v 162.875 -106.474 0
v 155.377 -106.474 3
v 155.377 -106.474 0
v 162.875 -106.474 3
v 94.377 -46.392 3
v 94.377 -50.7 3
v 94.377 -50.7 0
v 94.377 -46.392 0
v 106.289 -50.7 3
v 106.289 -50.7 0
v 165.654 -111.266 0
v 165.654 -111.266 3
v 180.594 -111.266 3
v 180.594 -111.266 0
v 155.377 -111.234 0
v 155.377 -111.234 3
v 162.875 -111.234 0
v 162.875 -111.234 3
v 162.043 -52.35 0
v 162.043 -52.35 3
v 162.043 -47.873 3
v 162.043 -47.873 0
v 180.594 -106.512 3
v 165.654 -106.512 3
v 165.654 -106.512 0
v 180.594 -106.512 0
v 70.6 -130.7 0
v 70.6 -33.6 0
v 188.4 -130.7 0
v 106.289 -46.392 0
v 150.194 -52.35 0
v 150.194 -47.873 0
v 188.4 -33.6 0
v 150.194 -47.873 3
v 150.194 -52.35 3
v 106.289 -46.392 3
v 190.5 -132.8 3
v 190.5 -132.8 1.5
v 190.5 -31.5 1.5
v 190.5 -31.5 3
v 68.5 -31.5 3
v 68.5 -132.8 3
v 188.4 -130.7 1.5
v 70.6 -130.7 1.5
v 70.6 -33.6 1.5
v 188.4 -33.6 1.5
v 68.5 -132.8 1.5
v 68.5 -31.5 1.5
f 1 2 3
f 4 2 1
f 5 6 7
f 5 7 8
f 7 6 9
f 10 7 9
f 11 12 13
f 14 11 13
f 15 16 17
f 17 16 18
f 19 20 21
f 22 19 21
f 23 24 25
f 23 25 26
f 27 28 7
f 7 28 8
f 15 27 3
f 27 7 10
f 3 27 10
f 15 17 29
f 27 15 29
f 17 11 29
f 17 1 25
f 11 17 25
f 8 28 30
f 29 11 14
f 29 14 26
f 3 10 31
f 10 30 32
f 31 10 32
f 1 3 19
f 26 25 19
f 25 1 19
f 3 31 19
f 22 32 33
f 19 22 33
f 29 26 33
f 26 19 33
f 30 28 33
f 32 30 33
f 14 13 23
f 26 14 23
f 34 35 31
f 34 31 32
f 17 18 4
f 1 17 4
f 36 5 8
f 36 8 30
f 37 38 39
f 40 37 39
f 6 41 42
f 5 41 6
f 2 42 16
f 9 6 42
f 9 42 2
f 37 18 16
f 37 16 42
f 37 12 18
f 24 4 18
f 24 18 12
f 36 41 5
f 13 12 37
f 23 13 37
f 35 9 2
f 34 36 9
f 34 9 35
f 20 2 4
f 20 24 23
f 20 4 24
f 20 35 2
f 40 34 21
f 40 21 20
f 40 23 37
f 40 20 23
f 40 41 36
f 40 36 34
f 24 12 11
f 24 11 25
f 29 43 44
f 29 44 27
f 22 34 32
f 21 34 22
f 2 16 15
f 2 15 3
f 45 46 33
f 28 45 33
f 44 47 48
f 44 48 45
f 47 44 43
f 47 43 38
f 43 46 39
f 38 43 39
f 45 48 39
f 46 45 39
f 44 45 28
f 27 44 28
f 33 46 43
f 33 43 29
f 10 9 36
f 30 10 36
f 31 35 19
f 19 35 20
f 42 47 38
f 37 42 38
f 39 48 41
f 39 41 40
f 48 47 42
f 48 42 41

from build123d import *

# Parameters (mm, degrees)
SKETCH1_W           = 122
SKETCH1_H           = 101.3
BOSS_EXTRUDE1_DEPTH = 3
SKETCH2_W           = 1.5
SKETCH2_H           = 2.1
CUT_EXTRUDE2_DEPTH  = 130
SKETCH3_W           = 1.5
SKETCH3_H           = 2.1
CUT_EXTRUDE3_DEPTH  = 123
SKETCH4_W           = 2.1
SKETCH4_H           = 1.5
CUT_EXTRUDE4_DEPTH  = 123
SKETCH5_W           = 2.1
SKETCH5_H           = 1.5
CUT_EXTRUDE5_DEPTH  = 123
SKETCH7_W           = 7.497772187
SKETCH7_H           = 4.759480864
CUT_EXTRUDE6_DEPTH  = 5
SKETCH8_W           = 11.848959364
SKETCH8_H           = 4.476273538
CUT_EXTRUDE7_DEPTH  = 5
SKETCH9_W           = 11.911321609
SKETCH9_H           = 4.308108171
CUT_EXTRUDE8_DEPTH  = 5
SKETCH6_W           = 14.939397766
SKETCH6_H           = 4.753444744
CUT_EXTRUDE9_DEPTH  = 5


with BuildPart() as part:
    # Sketch1 → Boss-Extrude1 (new body)
    with BuildSketch(Plane.XY):
        with Locations((129.5, -82.15)):
            Rectangle(SKETCH1_W, SKETCH1_H)
    extrude(amount=BOSS_EXTRUDE1_DEPTH)

    # Sketch2 → Cut-Extrude2 (cut)
    with BuildSketch(Plane(origin=(190.5, 0, 0), x_dir=(0, 0, -1), z_dir=(1, 0, 0))):
        with Locations((-0.75, -131.75)):
            Rectangle(SKETCH2_W, SKETCH2_H)
    extrude(amount=-CUT_EXTRUDE2_DEPTH, mode=Mode.SUBTRACT)

    # Sketch3 → Cut-Extrude3 (cut)
    with BuildSketch(Plane(origin=(190.5, 0, 0), x_dir=(0, 0, -1), z_dir=(1, 0, 0))):
        with Locations((-0.75, -32.55)):
            Rectangle(SKETCH3_W, SKETCH3_H)
    extrude(amount=-CUT_EXTRUDE3_DEPTH, mode=Mode.SUBTRACT)

    # Sketch4 → Cut-Extrude4 (cut)
    with BuildSketch(Plane(origin=(0, -31.5, 0), x_dir=(1, 0, 0), z_dir=(0, 1, 0))):
        with Locations((69.55, -0.75)):
            Rectangle(SKETCH4_W, SKETCH4_H)
    extrude(amount=-CUT_EXTRUDE4_DEPTH, mode=Mode.SUBTRACT)

    # Sketch5 → Cut-Extrude5 (cut)
    with BuildSketch(Plane(origin=(0, -31.5, 0), x_dir=(1, 0, 0), z_dir=(0, 1, 0))):
        with Locations((189.45, -0.75)):
            Rectangle(SKETCH5_W, SKETCH5_H)
    extrude(amount=-CUT_EXTRUDE5_DEPTH, mode=Mode.SUBTRACT)

    # Sketch7 → Cut-Extrude6 (cut)
    with BuildSketch(Plane.XY.offset(3)):
        with Locations((159.126113906, -108.853990326)):
            Rectangle(SKETCH7_W, SKETCH7_H)
    extrude(amount=-CUT_EXTRUDE6_DEPTH, mode=Mode.SUBTRACT)

    # Sketch8 → Cut-Extrude7 (cut)
    with BuildSketch(Plane.XY.offset(3)):
        with Locations((156.118860553, -50.111595953)):
            Rectangle(SKETCH8_W, SKETCH8_H)
    extrude(amount=-CUT_EXTRUDE7_DEPTH, mode=Mode.SUBTRACT)

    # Sketch9 → Cut-Extrude8 (cut)
    with BuildSketch(Plane.XY.offset(3)):
        with Locations((100.333019396, -48.546030804)):
            Rectangle(SKETCH9_W, SKETCH9_H)
    extrude(amount=-CUT_EXTRUDE8_DEPTH, mode=Mode.SUBTRACT)

    # Sketch6 → Cut-Extrude9 (cut)
    with BuildSketch(Plane.XY.offset(3)):
        with Locations((173.124127973, -108.889085644)):
            Rectangle(SKETCH6_W, SKETCH6_H)
    extrude(amount=-CUT_EXTRUDE9_DEPTH, mode=Mode.SUBTRACT)


solid = part.part
